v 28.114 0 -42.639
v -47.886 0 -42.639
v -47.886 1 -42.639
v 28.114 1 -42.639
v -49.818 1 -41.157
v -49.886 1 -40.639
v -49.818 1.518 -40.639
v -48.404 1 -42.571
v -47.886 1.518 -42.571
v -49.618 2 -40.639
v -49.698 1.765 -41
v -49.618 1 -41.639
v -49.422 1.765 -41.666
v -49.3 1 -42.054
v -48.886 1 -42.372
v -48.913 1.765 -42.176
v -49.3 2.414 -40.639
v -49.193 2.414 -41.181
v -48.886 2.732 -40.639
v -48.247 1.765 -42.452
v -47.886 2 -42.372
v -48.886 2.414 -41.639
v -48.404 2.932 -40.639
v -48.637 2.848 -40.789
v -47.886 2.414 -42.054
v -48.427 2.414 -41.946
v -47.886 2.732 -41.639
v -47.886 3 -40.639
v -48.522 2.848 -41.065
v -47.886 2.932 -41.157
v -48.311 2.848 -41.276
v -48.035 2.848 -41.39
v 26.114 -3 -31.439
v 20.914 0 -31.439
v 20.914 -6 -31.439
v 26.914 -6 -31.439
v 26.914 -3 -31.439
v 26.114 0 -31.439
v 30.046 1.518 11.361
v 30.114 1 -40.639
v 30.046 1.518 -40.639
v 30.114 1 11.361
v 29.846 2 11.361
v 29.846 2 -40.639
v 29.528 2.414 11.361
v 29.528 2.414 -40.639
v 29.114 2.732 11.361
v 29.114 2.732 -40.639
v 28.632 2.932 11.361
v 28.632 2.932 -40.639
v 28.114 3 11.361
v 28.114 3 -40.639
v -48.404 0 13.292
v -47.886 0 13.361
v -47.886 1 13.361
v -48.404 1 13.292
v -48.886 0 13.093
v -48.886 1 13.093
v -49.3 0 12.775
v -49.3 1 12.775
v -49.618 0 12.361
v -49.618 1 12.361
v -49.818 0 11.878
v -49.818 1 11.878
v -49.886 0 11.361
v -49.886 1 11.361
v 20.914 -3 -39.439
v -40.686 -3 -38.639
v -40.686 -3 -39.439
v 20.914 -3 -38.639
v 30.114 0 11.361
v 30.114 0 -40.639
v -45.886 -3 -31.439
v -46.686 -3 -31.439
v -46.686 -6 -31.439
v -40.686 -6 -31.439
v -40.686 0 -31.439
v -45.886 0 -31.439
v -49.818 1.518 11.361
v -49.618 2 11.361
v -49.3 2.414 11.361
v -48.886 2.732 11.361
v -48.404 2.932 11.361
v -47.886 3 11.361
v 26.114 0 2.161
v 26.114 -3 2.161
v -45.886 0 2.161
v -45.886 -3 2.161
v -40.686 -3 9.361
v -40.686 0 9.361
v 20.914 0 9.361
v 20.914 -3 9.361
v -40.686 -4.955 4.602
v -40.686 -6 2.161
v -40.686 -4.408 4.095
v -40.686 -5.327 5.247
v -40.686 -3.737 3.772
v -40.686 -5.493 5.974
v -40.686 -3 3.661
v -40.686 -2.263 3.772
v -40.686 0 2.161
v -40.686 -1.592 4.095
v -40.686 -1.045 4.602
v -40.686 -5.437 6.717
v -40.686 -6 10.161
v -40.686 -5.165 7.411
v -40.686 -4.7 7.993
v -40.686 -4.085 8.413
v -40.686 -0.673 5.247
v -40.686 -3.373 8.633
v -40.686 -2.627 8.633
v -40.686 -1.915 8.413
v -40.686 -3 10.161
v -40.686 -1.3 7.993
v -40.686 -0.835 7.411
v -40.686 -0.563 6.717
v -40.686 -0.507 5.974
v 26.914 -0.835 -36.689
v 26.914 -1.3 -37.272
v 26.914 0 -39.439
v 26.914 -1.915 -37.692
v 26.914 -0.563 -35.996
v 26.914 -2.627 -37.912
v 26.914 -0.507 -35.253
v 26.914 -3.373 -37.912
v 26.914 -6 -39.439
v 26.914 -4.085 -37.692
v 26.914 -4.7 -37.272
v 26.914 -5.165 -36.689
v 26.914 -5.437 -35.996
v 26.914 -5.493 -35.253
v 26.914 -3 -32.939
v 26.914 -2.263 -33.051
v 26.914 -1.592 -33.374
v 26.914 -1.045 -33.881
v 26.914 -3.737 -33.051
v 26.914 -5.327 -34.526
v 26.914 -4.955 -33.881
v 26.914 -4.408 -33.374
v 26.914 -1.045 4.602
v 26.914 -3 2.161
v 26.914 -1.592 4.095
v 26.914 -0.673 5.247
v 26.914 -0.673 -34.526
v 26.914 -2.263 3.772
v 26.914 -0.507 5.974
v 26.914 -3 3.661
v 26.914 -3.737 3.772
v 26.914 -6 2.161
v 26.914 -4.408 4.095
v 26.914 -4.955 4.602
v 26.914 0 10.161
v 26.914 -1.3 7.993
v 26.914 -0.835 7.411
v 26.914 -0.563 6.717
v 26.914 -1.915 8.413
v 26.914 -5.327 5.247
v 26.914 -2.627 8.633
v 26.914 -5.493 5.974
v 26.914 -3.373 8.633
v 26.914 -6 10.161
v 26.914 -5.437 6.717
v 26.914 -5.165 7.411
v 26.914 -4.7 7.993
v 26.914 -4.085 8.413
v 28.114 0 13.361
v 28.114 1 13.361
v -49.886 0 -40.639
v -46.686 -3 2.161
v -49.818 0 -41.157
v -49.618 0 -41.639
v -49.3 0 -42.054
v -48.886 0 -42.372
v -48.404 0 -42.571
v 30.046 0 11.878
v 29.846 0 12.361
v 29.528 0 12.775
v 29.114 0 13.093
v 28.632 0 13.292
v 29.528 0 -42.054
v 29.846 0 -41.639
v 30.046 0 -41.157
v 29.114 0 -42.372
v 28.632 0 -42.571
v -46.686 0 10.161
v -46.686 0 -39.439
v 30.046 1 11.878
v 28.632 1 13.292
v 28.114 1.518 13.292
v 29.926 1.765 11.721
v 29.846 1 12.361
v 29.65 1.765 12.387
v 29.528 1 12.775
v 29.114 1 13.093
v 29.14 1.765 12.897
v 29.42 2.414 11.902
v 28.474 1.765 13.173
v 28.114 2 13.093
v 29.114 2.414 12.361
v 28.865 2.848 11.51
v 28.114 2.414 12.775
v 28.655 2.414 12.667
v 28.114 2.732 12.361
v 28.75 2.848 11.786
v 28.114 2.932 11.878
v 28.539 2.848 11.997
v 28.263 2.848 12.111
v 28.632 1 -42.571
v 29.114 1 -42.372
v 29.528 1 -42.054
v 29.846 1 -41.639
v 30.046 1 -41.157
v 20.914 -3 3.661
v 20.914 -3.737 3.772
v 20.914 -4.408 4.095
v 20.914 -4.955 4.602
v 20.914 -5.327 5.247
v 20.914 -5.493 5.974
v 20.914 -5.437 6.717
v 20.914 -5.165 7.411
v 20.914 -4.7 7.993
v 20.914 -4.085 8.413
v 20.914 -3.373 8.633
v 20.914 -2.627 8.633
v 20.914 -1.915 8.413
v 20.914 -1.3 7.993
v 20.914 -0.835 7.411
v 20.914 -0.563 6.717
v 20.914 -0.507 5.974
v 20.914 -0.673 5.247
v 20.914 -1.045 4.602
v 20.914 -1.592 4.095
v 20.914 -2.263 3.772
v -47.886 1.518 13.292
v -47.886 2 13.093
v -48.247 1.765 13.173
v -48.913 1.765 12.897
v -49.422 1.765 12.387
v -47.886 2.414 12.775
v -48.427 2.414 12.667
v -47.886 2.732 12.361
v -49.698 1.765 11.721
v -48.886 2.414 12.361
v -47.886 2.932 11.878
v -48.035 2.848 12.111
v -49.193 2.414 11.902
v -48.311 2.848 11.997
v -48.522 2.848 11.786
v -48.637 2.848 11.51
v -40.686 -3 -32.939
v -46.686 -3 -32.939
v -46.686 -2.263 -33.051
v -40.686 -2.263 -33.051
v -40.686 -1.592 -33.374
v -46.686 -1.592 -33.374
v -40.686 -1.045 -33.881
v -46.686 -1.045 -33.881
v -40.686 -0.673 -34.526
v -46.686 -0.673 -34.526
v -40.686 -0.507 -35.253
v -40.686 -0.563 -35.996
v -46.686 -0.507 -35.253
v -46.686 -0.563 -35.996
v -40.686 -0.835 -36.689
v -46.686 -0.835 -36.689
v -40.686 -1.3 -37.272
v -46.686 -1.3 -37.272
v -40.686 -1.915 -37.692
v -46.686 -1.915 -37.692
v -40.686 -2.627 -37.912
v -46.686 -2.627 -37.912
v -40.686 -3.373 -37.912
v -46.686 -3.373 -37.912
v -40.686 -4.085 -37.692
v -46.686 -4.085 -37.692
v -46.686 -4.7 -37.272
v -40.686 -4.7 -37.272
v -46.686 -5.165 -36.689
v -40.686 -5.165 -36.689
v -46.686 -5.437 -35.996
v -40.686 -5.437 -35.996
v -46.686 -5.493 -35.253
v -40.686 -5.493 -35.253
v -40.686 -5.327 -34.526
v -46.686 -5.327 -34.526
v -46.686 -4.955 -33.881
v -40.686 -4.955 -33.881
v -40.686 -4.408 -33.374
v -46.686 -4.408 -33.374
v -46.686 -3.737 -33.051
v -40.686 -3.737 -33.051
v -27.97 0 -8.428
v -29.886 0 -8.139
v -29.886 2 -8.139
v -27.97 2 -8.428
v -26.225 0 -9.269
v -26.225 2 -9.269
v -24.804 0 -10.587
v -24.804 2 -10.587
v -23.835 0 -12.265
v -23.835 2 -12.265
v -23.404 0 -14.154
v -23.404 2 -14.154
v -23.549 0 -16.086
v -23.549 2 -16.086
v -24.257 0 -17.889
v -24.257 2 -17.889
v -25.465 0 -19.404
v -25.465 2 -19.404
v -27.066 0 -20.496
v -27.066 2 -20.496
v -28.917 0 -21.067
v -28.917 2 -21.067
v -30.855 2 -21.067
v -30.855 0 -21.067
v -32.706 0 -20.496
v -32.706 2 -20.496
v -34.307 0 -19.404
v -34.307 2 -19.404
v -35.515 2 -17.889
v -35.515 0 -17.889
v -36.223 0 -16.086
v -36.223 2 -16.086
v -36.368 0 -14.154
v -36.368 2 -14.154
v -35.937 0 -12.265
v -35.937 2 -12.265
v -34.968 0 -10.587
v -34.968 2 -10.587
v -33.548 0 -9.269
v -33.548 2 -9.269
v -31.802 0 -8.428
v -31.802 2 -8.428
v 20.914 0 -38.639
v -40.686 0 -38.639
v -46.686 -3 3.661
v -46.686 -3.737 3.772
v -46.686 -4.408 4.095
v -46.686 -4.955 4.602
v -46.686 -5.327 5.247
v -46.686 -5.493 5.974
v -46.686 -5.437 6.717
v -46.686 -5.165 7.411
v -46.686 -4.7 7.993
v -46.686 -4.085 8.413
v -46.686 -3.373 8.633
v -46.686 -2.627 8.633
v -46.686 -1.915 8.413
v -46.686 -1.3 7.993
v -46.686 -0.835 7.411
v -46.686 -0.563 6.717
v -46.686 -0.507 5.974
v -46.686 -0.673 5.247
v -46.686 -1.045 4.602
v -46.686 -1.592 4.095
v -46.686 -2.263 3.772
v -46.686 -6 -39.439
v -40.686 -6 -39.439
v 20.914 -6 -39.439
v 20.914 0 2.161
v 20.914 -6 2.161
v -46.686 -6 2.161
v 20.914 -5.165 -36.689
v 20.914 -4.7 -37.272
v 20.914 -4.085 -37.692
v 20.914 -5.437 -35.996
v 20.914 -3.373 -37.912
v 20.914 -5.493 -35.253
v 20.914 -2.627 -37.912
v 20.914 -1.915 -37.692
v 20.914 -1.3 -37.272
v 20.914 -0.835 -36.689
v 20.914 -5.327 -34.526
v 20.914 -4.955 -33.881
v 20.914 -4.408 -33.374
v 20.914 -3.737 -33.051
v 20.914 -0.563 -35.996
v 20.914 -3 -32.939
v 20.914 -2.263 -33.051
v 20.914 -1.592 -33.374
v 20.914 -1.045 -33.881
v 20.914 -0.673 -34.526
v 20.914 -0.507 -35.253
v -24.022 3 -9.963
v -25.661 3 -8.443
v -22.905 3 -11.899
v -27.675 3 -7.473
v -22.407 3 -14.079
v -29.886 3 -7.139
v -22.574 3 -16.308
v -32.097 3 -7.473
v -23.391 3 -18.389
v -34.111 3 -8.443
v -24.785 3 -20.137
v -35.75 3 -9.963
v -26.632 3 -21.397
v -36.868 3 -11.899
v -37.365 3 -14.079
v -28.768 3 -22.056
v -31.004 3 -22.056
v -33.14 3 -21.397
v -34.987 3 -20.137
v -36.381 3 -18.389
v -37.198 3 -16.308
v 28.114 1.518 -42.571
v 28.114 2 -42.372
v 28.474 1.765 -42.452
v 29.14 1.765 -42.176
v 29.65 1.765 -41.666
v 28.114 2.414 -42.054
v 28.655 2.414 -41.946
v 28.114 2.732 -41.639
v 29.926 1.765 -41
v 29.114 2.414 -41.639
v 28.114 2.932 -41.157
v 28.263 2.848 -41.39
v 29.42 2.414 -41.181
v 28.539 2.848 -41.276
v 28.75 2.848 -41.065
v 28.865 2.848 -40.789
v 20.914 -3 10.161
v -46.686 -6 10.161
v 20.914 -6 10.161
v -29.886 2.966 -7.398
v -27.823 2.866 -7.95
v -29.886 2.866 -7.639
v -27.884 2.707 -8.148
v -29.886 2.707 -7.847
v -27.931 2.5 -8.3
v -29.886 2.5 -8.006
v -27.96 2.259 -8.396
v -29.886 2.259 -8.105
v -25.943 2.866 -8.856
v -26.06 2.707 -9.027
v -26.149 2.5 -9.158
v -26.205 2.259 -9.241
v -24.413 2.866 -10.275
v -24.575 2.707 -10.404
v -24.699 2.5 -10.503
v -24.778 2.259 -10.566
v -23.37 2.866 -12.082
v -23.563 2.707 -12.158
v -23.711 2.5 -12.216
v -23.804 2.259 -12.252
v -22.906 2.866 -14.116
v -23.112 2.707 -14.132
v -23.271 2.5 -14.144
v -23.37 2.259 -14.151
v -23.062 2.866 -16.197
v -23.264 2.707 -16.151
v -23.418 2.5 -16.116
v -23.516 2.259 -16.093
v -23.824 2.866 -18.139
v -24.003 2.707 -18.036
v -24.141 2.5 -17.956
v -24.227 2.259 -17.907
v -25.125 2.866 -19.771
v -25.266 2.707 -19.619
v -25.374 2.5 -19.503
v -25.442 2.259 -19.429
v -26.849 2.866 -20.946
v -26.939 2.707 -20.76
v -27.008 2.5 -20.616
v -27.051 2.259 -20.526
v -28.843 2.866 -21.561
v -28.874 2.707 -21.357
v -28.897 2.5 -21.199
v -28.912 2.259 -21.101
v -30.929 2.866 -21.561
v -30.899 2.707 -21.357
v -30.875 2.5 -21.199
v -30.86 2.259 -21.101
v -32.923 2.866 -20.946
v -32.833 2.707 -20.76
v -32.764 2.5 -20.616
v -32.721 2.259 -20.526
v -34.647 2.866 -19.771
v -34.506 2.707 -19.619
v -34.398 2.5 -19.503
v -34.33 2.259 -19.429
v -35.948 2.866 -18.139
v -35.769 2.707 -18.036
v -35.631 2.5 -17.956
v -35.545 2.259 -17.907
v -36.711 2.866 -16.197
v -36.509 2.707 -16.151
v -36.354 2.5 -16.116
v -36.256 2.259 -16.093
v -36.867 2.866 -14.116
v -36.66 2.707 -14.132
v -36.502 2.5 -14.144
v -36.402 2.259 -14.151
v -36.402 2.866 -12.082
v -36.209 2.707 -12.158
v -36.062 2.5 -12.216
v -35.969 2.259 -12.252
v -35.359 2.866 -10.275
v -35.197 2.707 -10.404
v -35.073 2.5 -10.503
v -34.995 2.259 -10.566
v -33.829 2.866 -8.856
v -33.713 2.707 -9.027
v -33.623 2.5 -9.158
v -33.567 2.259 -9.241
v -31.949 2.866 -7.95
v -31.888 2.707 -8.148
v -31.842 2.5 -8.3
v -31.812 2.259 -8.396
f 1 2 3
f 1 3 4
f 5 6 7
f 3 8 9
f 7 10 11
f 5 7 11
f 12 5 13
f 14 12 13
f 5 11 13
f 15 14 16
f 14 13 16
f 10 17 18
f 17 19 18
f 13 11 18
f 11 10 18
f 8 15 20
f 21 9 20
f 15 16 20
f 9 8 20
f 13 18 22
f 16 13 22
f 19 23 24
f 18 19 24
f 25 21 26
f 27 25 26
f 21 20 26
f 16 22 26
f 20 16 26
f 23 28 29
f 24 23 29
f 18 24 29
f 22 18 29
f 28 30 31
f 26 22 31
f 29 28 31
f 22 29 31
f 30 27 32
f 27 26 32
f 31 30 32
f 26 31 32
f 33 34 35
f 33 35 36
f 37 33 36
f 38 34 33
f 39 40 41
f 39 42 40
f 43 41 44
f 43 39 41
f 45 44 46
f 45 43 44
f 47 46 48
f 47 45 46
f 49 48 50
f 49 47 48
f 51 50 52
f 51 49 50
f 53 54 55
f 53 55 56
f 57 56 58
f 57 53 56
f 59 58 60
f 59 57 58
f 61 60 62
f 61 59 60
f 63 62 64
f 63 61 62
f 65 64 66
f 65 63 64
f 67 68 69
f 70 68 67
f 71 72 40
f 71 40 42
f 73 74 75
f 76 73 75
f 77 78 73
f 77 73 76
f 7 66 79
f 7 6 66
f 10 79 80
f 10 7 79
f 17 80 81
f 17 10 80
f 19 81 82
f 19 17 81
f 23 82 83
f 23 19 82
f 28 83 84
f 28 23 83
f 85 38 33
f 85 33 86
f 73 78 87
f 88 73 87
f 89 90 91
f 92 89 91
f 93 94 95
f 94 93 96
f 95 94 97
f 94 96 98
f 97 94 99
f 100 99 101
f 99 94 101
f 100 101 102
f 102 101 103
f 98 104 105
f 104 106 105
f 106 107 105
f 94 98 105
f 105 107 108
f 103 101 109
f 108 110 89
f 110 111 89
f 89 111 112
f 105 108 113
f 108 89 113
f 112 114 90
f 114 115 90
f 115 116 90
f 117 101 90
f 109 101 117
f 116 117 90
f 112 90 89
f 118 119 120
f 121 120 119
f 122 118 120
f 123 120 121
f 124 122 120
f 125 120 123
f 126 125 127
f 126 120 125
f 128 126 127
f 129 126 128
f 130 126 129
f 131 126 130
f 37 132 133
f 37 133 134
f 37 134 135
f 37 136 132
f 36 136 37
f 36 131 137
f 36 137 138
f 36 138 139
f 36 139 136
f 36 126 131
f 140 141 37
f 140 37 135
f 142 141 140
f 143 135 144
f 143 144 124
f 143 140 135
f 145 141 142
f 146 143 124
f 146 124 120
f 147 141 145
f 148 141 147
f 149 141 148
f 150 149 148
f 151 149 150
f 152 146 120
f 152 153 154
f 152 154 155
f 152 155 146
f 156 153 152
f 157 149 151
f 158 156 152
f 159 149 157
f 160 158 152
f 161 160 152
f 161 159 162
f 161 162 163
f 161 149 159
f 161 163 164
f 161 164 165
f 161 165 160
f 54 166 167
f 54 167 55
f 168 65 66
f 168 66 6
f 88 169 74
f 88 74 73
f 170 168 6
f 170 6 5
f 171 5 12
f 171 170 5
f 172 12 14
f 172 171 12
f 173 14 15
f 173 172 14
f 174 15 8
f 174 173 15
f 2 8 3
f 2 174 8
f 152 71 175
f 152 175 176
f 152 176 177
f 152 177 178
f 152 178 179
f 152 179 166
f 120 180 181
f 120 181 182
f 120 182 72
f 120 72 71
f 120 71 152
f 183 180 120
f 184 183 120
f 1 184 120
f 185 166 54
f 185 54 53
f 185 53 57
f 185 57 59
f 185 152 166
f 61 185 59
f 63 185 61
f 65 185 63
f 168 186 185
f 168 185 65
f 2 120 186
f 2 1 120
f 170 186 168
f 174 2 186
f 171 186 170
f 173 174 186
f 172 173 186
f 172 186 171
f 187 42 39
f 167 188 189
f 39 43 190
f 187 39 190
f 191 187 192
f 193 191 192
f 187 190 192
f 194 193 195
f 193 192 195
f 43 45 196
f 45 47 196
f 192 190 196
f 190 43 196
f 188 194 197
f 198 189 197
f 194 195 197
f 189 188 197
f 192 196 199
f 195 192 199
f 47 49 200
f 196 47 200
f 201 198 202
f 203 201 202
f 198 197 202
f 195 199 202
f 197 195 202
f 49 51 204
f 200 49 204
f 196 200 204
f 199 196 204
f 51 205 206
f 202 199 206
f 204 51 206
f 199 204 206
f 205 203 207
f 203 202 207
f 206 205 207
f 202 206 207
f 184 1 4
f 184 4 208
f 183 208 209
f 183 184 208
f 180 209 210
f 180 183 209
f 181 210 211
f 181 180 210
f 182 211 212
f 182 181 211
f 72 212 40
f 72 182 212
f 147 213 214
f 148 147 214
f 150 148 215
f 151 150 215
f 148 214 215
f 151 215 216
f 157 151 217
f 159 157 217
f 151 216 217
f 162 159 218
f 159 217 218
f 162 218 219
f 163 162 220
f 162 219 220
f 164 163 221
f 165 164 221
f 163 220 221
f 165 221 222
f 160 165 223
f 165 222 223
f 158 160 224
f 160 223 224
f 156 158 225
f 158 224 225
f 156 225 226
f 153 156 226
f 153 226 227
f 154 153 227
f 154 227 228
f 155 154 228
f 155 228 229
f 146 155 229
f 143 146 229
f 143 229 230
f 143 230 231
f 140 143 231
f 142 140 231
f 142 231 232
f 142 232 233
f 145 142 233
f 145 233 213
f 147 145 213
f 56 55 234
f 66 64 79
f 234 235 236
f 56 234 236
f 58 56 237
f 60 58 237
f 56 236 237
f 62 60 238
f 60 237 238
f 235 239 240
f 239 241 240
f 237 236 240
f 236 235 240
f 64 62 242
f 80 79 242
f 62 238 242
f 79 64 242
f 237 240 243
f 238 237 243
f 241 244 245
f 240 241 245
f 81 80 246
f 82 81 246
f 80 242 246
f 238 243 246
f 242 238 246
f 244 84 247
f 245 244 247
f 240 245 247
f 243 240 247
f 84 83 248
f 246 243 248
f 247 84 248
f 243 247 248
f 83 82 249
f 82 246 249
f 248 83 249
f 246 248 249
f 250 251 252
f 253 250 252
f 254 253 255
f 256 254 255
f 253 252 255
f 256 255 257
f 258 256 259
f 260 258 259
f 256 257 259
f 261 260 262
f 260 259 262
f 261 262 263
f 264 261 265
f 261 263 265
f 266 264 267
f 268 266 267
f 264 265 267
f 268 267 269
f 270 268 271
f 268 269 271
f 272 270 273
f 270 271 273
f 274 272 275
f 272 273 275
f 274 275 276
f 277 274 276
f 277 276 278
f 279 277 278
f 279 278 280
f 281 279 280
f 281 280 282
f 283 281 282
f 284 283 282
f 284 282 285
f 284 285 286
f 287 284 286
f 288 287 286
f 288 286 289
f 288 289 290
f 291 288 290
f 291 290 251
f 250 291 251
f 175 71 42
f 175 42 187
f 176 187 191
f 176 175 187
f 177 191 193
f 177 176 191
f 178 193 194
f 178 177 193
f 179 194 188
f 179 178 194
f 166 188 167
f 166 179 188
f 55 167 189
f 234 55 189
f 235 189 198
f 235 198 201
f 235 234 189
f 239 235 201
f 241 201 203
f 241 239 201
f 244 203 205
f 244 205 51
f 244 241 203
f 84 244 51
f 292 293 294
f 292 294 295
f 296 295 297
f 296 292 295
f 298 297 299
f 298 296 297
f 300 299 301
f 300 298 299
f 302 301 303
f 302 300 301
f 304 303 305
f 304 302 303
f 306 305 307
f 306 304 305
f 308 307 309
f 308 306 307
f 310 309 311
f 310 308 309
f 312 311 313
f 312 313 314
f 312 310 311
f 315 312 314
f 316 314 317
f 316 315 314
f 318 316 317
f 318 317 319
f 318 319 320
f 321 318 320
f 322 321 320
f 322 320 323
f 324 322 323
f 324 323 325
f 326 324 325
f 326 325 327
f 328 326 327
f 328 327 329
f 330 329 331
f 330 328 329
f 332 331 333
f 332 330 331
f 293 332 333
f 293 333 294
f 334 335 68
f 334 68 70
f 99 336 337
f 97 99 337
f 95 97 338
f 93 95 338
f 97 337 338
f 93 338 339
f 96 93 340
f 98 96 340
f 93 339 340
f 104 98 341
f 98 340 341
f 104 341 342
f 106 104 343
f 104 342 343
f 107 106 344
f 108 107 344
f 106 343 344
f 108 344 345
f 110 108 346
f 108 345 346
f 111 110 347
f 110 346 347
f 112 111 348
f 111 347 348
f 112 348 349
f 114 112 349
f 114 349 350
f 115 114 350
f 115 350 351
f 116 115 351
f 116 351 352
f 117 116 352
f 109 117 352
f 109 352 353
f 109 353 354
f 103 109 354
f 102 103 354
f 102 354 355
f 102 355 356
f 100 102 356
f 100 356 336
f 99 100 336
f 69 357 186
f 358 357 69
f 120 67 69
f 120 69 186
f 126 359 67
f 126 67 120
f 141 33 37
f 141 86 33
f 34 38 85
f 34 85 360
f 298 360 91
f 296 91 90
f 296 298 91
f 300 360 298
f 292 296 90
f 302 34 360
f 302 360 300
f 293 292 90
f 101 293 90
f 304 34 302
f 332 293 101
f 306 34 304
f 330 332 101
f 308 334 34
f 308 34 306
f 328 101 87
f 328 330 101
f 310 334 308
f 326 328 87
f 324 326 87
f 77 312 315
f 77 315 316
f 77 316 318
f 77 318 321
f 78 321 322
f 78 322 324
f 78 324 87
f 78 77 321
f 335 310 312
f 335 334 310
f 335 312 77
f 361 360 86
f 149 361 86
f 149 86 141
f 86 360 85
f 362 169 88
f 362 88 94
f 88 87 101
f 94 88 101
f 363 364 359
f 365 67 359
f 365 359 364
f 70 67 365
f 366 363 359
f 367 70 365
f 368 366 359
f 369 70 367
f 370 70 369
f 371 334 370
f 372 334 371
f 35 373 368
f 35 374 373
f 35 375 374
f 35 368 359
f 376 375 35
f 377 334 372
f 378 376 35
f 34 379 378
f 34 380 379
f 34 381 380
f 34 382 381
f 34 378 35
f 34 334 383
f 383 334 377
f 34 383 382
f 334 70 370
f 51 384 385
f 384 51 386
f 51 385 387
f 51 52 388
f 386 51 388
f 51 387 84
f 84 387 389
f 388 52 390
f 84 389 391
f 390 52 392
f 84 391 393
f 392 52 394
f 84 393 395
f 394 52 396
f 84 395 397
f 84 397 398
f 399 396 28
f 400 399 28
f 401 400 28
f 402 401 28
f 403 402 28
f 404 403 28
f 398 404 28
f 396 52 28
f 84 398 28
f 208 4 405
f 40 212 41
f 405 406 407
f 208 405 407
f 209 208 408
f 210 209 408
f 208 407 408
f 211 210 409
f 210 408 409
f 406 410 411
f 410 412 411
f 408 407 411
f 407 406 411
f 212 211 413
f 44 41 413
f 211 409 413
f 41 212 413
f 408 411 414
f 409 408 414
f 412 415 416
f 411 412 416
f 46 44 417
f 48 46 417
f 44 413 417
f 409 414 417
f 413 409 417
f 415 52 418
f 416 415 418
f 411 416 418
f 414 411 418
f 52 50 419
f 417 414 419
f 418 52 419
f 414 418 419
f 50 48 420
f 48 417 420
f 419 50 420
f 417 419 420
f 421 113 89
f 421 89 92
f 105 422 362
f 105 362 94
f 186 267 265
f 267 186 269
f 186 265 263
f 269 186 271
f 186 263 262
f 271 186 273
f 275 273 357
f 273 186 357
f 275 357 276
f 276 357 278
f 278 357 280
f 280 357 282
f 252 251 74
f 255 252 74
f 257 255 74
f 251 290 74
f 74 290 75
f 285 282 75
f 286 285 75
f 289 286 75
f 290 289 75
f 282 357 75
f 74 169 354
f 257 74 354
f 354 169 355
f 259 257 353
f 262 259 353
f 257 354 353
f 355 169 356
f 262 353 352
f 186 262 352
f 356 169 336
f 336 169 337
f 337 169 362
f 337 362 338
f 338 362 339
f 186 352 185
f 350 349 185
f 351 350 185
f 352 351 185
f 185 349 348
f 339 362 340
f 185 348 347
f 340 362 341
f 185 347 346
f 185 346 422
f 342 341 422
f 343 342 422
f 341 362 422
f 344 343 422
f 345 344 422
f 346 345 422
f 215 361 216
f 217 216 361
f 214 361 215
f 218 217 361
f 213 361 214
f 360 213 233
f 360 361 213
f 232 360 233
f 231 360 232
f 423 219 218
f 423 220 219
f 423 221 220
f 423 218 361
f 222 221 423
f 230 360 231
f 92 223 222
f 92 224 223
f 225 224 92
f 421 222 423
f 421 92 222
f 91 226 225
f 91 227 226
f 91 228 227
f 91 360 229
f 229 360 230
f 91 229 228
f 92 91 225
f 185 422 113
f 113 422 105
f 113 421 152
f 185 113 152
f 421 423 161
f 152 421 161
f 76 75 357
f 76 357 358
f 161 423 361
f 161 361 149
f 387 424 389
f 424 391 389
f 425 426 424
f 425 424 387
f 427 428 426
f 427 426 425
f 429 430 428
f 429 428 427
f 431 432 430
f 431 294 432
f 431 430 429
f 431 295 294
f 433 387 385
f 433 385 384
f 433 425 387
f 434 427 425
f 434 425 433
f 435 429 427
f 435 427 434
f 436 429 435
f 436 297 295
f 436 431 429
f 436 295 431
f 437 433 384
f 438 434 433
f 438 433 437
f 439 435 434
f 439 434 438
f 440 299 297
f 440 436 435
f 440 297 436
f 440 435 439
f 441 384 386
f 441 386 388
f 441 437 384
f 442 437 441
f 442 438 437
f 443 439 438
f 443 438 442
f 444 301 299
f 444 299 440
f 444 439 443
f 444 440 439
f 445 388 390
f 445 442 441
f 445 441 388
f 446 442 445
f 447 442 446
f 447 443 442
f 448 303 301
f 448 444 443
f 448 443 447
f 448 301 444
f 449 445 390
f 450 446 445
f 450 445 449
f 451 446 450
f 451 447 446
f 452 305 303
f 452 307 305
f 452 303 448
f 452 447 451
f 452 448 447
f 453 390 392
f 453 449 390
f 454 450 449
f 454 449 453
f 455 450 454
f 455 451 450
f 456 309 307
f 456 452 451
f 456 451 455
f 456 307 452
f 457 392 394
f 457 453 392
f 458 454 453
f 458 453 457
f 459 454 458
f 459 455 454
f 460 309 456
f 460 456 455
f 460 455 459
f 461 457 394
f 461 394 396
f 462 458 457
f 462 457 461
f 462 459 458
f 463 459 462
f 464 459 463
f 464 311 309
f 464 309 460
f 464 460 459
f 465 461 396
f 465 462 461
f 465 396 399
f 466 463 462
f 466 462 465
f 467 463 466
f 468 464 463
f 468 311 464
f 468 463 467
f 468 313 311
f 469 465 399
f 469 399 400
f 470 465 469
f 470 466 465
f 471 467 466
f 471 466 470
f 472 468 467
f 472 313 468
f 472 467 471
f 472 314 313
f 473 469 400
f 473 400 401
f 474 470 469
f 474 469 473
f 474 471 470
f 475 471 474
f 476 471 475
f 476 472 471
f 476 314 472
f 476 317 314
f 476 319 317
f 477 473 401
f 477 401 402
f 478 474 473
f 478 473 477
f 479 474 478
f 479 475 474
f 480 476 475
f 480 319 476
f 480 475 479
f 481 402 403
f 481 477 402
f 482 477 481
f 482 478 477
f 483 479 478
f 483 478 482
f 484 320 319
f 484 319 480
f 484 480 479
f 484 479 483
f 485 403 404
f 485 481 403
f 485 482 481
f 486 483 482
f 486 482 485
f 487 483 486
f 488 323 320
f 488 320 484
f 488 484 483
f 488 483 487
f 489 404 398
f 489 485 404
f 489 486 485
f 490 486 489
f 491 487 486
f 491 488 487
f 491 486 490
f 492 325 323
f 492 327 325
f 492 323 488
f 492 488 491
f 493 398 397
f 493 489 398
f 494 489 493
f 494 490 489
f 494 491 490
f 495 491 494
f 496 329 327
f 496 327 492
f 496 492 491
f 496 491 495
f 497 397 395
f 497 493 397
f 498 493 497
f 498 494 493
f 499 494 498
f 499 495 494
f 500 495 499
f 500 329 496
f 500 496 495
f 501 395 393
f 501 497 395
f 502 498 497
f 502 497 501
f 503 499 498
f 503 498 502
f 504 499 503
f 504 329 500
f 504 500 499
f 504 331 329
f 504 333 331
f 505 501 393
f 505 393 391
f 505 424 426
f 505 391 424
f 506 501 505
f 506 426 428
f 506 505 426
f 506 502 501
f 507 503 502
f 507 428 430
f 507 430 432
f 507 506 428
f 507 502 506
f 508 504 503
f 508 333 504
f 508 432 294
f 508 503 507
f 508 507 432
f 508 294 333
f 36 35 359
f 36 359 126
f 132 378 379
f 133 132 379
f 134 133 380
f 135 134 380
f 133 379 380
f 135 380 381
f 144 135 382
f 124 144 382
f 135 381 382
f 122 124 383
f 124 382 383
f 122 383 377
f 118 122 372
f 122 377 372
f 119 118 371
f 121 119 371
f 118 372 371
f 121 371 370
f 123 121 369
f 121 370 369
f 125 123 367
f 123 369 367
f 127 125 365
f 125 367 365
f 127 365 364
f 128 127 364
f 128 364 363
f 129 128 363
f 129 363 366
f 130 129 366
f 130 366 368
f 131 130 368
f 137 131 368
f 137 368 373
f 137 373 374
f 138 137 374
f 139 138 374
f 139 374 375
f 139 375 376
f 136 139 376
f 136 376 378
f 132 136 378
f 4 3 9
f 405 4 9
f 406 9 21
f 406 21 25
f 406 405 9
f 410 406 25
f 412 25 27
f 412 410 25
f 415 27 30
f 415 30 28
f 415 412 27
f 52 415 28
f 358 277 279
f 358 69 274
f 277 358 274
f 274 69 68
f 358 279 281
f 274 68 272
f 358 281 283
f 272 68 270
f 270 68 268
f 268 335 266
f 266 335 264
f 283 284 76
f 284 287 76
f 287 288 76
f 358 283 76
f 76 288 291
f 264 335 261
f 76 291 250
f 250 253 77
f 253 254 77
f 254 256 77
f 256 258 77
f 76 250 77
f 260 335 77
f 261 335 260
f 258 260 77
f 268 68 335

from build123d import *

# Parameters (mm, degrees)
SKETCH1_R           = 6.5
BOSS_EXTRUDE1_DEPTH = 3
FILLET1_R           = 2
SKETCH3_W           = 74
SKETCH3_H           = 50
SKETCH3_W_2         = 72
SKETCH3_H_2         = 48
BOSS_EXTRUDE2_DEPTH = 3
SKETCH4_W           = 74
SKETCH4_H           = 50
SKETCH4_W_2         = 73.6
SKETCH4_H_2         = 49.6
CUT_EXTRUDE1_DEPTH  = 3
FILLET2_R           = 1
SKETCH6_W           = 6
SKETCH6_H           = 8
BOSS_EXTRUDE3_DEPTH = 6
SKETCH7_R           = 2.5
CUT_EXTRUDE2_DEPTH  = 89.047516081


with BuildPart() as part:
    # Sketch1 → Boss-Extrude1 (new body)
    with BuildSketch(Plane(origin=(0, 0, 0), x_dir=(1, 0, 0), z_dir=(0, 1, 0))):
        with BuildLine():
            Line((-47.886115273, 42.639478046), (28.113884727, 42.639478046))
            ThreePointArc((28.113884727, 42.639478046), (29.528098289, 42.053691608), (30.113884727, 40.639478046))
            Line((30.113884727, 40.639478046), (30.113884727, -11.360521954))
            ThreePointArc((30.113884727, -11.360521954), (29.528098289, -12.774735517), (28.113884727, -13.360521954))
            Line((28.113884727, -13.360521954), (-47.886115273, -13.360521954))
            ThreePointArc((-47.886115273, -13.360521954), (-49.300328836, -12.774735517), (-49.886115273, -11.360521954))
            Line((-49.886115273, -11.360521954), (-49.886115273, 40.639478046))
            ThreePointArc((-49.886115273, 40.639478046), (-49.300328836, 42.053691608), (-47.886115273, 42.639478046))
        make_face()
        with Locations(Location((-29.886115273, 14.639478046, 0), (0, 0, 270))):
            Circle(SKETCH1_R, mode=Mode.SUBTRACT)
    extrude(amount=BOSS_EXTRUDE1_DEPTH)

    # Fillet1
    fillet1_edges = [part.edges().sort_by_distance(p)[0] for p in [
        (29.528098289, 3, -42.053691608),
        (-9.886115273, 3, -42.639478046),
        (-49.300328836, 3, -42.053691608),
        (-49.886115273, 3, -14.639478046),
        (-49.300328836, 3, 12.774735517),
        (-9.886115273, 3, 13.360521954),
        (29.528098289, 3, 12.774735517),
        (30.113884727, 3, -14.639478046),
    ]]
    fillet(fillet1_edges, radius=FILLET1_R)

    # Sketch3 → Boss-Extrude2 (add)
    with BuildSketch(Plane.XZ):
        with Locations((-9.886115273, -14.639478046)):
            Rectangle(SKETCH3_W, SKETCH3_H)
        with Locations((-9.886115273, -14.639478046)):
            Rectangle(SKETCH3_W_2, SKETCH3_H_2, mode=Mode.SUBTRACT)
    extrude(amount=BOSS_EXTRUDE2_DEPTH)

    # Sketch4 → Cut-Extrude1 (cut)
    with BuildSketch(Plane.XZ.offset(3)):
        with Locations((-9.886115273, -14.639478046)):
            Rectangle(SKETCH4_W, SKETCH4_H)
        with Locations((-9.886115273, -14.639478046)):
            Rectangle(SKETCH4_W_2, SKETCH4_H_2, mode=Mode.SUBTRACT)
    extrude(amount=-CUT_EXTRUDE1_DEPTH, mode=Mode.SUBTRACT)

    # Fillet2
    fillet2_edges = [part.edges().sort_by_distance(p)[0] for p in [
        (-29.886115273, 3, -21.139478046),
    ]]
    fillet(fillet2_edges, radius=FILLET2_R)

    # Sketch6 → Boss-Extrude3 (add)
    with BuildSketch(Plane.XZ):
        with Locations((-43.686115273, 6.160521954)):
            Rectangle(SKETCH6_W, SKETCH6_H)
        with Locations((23.913884727, 6.160521954)):
            Rectangle(SKETCH6_W, SKETCH6_H)
        with Locations((23.913884727, -35.439478046)):
            Rectangle(SKETCH6_W, SKETCH6_H)
        with Locations((-43.686115273, -35.439478046)):
            Rectangle(SKETCH6_W, SKETCH6_H)
    extrude(amount=BOSS_EXTRUDE3_DEPTH)

    # Sketch7 → Cut-Extrude2 (cut, through all)
    with BuildSketch(Plane.ZY.offset(46.686115273)):
        with Locations((-35.439478046, -3)):
            Circle(SKETCH7_R)
        with Locations(Location((6.160521954, -3, 0), (0, 0, 180))):
            Circle(SKETCH7_R)
    extrude(amount=-CUT_EXTRUDE2_DEPTH, mode=Mode.SUBTRACT)


solid = part.part
